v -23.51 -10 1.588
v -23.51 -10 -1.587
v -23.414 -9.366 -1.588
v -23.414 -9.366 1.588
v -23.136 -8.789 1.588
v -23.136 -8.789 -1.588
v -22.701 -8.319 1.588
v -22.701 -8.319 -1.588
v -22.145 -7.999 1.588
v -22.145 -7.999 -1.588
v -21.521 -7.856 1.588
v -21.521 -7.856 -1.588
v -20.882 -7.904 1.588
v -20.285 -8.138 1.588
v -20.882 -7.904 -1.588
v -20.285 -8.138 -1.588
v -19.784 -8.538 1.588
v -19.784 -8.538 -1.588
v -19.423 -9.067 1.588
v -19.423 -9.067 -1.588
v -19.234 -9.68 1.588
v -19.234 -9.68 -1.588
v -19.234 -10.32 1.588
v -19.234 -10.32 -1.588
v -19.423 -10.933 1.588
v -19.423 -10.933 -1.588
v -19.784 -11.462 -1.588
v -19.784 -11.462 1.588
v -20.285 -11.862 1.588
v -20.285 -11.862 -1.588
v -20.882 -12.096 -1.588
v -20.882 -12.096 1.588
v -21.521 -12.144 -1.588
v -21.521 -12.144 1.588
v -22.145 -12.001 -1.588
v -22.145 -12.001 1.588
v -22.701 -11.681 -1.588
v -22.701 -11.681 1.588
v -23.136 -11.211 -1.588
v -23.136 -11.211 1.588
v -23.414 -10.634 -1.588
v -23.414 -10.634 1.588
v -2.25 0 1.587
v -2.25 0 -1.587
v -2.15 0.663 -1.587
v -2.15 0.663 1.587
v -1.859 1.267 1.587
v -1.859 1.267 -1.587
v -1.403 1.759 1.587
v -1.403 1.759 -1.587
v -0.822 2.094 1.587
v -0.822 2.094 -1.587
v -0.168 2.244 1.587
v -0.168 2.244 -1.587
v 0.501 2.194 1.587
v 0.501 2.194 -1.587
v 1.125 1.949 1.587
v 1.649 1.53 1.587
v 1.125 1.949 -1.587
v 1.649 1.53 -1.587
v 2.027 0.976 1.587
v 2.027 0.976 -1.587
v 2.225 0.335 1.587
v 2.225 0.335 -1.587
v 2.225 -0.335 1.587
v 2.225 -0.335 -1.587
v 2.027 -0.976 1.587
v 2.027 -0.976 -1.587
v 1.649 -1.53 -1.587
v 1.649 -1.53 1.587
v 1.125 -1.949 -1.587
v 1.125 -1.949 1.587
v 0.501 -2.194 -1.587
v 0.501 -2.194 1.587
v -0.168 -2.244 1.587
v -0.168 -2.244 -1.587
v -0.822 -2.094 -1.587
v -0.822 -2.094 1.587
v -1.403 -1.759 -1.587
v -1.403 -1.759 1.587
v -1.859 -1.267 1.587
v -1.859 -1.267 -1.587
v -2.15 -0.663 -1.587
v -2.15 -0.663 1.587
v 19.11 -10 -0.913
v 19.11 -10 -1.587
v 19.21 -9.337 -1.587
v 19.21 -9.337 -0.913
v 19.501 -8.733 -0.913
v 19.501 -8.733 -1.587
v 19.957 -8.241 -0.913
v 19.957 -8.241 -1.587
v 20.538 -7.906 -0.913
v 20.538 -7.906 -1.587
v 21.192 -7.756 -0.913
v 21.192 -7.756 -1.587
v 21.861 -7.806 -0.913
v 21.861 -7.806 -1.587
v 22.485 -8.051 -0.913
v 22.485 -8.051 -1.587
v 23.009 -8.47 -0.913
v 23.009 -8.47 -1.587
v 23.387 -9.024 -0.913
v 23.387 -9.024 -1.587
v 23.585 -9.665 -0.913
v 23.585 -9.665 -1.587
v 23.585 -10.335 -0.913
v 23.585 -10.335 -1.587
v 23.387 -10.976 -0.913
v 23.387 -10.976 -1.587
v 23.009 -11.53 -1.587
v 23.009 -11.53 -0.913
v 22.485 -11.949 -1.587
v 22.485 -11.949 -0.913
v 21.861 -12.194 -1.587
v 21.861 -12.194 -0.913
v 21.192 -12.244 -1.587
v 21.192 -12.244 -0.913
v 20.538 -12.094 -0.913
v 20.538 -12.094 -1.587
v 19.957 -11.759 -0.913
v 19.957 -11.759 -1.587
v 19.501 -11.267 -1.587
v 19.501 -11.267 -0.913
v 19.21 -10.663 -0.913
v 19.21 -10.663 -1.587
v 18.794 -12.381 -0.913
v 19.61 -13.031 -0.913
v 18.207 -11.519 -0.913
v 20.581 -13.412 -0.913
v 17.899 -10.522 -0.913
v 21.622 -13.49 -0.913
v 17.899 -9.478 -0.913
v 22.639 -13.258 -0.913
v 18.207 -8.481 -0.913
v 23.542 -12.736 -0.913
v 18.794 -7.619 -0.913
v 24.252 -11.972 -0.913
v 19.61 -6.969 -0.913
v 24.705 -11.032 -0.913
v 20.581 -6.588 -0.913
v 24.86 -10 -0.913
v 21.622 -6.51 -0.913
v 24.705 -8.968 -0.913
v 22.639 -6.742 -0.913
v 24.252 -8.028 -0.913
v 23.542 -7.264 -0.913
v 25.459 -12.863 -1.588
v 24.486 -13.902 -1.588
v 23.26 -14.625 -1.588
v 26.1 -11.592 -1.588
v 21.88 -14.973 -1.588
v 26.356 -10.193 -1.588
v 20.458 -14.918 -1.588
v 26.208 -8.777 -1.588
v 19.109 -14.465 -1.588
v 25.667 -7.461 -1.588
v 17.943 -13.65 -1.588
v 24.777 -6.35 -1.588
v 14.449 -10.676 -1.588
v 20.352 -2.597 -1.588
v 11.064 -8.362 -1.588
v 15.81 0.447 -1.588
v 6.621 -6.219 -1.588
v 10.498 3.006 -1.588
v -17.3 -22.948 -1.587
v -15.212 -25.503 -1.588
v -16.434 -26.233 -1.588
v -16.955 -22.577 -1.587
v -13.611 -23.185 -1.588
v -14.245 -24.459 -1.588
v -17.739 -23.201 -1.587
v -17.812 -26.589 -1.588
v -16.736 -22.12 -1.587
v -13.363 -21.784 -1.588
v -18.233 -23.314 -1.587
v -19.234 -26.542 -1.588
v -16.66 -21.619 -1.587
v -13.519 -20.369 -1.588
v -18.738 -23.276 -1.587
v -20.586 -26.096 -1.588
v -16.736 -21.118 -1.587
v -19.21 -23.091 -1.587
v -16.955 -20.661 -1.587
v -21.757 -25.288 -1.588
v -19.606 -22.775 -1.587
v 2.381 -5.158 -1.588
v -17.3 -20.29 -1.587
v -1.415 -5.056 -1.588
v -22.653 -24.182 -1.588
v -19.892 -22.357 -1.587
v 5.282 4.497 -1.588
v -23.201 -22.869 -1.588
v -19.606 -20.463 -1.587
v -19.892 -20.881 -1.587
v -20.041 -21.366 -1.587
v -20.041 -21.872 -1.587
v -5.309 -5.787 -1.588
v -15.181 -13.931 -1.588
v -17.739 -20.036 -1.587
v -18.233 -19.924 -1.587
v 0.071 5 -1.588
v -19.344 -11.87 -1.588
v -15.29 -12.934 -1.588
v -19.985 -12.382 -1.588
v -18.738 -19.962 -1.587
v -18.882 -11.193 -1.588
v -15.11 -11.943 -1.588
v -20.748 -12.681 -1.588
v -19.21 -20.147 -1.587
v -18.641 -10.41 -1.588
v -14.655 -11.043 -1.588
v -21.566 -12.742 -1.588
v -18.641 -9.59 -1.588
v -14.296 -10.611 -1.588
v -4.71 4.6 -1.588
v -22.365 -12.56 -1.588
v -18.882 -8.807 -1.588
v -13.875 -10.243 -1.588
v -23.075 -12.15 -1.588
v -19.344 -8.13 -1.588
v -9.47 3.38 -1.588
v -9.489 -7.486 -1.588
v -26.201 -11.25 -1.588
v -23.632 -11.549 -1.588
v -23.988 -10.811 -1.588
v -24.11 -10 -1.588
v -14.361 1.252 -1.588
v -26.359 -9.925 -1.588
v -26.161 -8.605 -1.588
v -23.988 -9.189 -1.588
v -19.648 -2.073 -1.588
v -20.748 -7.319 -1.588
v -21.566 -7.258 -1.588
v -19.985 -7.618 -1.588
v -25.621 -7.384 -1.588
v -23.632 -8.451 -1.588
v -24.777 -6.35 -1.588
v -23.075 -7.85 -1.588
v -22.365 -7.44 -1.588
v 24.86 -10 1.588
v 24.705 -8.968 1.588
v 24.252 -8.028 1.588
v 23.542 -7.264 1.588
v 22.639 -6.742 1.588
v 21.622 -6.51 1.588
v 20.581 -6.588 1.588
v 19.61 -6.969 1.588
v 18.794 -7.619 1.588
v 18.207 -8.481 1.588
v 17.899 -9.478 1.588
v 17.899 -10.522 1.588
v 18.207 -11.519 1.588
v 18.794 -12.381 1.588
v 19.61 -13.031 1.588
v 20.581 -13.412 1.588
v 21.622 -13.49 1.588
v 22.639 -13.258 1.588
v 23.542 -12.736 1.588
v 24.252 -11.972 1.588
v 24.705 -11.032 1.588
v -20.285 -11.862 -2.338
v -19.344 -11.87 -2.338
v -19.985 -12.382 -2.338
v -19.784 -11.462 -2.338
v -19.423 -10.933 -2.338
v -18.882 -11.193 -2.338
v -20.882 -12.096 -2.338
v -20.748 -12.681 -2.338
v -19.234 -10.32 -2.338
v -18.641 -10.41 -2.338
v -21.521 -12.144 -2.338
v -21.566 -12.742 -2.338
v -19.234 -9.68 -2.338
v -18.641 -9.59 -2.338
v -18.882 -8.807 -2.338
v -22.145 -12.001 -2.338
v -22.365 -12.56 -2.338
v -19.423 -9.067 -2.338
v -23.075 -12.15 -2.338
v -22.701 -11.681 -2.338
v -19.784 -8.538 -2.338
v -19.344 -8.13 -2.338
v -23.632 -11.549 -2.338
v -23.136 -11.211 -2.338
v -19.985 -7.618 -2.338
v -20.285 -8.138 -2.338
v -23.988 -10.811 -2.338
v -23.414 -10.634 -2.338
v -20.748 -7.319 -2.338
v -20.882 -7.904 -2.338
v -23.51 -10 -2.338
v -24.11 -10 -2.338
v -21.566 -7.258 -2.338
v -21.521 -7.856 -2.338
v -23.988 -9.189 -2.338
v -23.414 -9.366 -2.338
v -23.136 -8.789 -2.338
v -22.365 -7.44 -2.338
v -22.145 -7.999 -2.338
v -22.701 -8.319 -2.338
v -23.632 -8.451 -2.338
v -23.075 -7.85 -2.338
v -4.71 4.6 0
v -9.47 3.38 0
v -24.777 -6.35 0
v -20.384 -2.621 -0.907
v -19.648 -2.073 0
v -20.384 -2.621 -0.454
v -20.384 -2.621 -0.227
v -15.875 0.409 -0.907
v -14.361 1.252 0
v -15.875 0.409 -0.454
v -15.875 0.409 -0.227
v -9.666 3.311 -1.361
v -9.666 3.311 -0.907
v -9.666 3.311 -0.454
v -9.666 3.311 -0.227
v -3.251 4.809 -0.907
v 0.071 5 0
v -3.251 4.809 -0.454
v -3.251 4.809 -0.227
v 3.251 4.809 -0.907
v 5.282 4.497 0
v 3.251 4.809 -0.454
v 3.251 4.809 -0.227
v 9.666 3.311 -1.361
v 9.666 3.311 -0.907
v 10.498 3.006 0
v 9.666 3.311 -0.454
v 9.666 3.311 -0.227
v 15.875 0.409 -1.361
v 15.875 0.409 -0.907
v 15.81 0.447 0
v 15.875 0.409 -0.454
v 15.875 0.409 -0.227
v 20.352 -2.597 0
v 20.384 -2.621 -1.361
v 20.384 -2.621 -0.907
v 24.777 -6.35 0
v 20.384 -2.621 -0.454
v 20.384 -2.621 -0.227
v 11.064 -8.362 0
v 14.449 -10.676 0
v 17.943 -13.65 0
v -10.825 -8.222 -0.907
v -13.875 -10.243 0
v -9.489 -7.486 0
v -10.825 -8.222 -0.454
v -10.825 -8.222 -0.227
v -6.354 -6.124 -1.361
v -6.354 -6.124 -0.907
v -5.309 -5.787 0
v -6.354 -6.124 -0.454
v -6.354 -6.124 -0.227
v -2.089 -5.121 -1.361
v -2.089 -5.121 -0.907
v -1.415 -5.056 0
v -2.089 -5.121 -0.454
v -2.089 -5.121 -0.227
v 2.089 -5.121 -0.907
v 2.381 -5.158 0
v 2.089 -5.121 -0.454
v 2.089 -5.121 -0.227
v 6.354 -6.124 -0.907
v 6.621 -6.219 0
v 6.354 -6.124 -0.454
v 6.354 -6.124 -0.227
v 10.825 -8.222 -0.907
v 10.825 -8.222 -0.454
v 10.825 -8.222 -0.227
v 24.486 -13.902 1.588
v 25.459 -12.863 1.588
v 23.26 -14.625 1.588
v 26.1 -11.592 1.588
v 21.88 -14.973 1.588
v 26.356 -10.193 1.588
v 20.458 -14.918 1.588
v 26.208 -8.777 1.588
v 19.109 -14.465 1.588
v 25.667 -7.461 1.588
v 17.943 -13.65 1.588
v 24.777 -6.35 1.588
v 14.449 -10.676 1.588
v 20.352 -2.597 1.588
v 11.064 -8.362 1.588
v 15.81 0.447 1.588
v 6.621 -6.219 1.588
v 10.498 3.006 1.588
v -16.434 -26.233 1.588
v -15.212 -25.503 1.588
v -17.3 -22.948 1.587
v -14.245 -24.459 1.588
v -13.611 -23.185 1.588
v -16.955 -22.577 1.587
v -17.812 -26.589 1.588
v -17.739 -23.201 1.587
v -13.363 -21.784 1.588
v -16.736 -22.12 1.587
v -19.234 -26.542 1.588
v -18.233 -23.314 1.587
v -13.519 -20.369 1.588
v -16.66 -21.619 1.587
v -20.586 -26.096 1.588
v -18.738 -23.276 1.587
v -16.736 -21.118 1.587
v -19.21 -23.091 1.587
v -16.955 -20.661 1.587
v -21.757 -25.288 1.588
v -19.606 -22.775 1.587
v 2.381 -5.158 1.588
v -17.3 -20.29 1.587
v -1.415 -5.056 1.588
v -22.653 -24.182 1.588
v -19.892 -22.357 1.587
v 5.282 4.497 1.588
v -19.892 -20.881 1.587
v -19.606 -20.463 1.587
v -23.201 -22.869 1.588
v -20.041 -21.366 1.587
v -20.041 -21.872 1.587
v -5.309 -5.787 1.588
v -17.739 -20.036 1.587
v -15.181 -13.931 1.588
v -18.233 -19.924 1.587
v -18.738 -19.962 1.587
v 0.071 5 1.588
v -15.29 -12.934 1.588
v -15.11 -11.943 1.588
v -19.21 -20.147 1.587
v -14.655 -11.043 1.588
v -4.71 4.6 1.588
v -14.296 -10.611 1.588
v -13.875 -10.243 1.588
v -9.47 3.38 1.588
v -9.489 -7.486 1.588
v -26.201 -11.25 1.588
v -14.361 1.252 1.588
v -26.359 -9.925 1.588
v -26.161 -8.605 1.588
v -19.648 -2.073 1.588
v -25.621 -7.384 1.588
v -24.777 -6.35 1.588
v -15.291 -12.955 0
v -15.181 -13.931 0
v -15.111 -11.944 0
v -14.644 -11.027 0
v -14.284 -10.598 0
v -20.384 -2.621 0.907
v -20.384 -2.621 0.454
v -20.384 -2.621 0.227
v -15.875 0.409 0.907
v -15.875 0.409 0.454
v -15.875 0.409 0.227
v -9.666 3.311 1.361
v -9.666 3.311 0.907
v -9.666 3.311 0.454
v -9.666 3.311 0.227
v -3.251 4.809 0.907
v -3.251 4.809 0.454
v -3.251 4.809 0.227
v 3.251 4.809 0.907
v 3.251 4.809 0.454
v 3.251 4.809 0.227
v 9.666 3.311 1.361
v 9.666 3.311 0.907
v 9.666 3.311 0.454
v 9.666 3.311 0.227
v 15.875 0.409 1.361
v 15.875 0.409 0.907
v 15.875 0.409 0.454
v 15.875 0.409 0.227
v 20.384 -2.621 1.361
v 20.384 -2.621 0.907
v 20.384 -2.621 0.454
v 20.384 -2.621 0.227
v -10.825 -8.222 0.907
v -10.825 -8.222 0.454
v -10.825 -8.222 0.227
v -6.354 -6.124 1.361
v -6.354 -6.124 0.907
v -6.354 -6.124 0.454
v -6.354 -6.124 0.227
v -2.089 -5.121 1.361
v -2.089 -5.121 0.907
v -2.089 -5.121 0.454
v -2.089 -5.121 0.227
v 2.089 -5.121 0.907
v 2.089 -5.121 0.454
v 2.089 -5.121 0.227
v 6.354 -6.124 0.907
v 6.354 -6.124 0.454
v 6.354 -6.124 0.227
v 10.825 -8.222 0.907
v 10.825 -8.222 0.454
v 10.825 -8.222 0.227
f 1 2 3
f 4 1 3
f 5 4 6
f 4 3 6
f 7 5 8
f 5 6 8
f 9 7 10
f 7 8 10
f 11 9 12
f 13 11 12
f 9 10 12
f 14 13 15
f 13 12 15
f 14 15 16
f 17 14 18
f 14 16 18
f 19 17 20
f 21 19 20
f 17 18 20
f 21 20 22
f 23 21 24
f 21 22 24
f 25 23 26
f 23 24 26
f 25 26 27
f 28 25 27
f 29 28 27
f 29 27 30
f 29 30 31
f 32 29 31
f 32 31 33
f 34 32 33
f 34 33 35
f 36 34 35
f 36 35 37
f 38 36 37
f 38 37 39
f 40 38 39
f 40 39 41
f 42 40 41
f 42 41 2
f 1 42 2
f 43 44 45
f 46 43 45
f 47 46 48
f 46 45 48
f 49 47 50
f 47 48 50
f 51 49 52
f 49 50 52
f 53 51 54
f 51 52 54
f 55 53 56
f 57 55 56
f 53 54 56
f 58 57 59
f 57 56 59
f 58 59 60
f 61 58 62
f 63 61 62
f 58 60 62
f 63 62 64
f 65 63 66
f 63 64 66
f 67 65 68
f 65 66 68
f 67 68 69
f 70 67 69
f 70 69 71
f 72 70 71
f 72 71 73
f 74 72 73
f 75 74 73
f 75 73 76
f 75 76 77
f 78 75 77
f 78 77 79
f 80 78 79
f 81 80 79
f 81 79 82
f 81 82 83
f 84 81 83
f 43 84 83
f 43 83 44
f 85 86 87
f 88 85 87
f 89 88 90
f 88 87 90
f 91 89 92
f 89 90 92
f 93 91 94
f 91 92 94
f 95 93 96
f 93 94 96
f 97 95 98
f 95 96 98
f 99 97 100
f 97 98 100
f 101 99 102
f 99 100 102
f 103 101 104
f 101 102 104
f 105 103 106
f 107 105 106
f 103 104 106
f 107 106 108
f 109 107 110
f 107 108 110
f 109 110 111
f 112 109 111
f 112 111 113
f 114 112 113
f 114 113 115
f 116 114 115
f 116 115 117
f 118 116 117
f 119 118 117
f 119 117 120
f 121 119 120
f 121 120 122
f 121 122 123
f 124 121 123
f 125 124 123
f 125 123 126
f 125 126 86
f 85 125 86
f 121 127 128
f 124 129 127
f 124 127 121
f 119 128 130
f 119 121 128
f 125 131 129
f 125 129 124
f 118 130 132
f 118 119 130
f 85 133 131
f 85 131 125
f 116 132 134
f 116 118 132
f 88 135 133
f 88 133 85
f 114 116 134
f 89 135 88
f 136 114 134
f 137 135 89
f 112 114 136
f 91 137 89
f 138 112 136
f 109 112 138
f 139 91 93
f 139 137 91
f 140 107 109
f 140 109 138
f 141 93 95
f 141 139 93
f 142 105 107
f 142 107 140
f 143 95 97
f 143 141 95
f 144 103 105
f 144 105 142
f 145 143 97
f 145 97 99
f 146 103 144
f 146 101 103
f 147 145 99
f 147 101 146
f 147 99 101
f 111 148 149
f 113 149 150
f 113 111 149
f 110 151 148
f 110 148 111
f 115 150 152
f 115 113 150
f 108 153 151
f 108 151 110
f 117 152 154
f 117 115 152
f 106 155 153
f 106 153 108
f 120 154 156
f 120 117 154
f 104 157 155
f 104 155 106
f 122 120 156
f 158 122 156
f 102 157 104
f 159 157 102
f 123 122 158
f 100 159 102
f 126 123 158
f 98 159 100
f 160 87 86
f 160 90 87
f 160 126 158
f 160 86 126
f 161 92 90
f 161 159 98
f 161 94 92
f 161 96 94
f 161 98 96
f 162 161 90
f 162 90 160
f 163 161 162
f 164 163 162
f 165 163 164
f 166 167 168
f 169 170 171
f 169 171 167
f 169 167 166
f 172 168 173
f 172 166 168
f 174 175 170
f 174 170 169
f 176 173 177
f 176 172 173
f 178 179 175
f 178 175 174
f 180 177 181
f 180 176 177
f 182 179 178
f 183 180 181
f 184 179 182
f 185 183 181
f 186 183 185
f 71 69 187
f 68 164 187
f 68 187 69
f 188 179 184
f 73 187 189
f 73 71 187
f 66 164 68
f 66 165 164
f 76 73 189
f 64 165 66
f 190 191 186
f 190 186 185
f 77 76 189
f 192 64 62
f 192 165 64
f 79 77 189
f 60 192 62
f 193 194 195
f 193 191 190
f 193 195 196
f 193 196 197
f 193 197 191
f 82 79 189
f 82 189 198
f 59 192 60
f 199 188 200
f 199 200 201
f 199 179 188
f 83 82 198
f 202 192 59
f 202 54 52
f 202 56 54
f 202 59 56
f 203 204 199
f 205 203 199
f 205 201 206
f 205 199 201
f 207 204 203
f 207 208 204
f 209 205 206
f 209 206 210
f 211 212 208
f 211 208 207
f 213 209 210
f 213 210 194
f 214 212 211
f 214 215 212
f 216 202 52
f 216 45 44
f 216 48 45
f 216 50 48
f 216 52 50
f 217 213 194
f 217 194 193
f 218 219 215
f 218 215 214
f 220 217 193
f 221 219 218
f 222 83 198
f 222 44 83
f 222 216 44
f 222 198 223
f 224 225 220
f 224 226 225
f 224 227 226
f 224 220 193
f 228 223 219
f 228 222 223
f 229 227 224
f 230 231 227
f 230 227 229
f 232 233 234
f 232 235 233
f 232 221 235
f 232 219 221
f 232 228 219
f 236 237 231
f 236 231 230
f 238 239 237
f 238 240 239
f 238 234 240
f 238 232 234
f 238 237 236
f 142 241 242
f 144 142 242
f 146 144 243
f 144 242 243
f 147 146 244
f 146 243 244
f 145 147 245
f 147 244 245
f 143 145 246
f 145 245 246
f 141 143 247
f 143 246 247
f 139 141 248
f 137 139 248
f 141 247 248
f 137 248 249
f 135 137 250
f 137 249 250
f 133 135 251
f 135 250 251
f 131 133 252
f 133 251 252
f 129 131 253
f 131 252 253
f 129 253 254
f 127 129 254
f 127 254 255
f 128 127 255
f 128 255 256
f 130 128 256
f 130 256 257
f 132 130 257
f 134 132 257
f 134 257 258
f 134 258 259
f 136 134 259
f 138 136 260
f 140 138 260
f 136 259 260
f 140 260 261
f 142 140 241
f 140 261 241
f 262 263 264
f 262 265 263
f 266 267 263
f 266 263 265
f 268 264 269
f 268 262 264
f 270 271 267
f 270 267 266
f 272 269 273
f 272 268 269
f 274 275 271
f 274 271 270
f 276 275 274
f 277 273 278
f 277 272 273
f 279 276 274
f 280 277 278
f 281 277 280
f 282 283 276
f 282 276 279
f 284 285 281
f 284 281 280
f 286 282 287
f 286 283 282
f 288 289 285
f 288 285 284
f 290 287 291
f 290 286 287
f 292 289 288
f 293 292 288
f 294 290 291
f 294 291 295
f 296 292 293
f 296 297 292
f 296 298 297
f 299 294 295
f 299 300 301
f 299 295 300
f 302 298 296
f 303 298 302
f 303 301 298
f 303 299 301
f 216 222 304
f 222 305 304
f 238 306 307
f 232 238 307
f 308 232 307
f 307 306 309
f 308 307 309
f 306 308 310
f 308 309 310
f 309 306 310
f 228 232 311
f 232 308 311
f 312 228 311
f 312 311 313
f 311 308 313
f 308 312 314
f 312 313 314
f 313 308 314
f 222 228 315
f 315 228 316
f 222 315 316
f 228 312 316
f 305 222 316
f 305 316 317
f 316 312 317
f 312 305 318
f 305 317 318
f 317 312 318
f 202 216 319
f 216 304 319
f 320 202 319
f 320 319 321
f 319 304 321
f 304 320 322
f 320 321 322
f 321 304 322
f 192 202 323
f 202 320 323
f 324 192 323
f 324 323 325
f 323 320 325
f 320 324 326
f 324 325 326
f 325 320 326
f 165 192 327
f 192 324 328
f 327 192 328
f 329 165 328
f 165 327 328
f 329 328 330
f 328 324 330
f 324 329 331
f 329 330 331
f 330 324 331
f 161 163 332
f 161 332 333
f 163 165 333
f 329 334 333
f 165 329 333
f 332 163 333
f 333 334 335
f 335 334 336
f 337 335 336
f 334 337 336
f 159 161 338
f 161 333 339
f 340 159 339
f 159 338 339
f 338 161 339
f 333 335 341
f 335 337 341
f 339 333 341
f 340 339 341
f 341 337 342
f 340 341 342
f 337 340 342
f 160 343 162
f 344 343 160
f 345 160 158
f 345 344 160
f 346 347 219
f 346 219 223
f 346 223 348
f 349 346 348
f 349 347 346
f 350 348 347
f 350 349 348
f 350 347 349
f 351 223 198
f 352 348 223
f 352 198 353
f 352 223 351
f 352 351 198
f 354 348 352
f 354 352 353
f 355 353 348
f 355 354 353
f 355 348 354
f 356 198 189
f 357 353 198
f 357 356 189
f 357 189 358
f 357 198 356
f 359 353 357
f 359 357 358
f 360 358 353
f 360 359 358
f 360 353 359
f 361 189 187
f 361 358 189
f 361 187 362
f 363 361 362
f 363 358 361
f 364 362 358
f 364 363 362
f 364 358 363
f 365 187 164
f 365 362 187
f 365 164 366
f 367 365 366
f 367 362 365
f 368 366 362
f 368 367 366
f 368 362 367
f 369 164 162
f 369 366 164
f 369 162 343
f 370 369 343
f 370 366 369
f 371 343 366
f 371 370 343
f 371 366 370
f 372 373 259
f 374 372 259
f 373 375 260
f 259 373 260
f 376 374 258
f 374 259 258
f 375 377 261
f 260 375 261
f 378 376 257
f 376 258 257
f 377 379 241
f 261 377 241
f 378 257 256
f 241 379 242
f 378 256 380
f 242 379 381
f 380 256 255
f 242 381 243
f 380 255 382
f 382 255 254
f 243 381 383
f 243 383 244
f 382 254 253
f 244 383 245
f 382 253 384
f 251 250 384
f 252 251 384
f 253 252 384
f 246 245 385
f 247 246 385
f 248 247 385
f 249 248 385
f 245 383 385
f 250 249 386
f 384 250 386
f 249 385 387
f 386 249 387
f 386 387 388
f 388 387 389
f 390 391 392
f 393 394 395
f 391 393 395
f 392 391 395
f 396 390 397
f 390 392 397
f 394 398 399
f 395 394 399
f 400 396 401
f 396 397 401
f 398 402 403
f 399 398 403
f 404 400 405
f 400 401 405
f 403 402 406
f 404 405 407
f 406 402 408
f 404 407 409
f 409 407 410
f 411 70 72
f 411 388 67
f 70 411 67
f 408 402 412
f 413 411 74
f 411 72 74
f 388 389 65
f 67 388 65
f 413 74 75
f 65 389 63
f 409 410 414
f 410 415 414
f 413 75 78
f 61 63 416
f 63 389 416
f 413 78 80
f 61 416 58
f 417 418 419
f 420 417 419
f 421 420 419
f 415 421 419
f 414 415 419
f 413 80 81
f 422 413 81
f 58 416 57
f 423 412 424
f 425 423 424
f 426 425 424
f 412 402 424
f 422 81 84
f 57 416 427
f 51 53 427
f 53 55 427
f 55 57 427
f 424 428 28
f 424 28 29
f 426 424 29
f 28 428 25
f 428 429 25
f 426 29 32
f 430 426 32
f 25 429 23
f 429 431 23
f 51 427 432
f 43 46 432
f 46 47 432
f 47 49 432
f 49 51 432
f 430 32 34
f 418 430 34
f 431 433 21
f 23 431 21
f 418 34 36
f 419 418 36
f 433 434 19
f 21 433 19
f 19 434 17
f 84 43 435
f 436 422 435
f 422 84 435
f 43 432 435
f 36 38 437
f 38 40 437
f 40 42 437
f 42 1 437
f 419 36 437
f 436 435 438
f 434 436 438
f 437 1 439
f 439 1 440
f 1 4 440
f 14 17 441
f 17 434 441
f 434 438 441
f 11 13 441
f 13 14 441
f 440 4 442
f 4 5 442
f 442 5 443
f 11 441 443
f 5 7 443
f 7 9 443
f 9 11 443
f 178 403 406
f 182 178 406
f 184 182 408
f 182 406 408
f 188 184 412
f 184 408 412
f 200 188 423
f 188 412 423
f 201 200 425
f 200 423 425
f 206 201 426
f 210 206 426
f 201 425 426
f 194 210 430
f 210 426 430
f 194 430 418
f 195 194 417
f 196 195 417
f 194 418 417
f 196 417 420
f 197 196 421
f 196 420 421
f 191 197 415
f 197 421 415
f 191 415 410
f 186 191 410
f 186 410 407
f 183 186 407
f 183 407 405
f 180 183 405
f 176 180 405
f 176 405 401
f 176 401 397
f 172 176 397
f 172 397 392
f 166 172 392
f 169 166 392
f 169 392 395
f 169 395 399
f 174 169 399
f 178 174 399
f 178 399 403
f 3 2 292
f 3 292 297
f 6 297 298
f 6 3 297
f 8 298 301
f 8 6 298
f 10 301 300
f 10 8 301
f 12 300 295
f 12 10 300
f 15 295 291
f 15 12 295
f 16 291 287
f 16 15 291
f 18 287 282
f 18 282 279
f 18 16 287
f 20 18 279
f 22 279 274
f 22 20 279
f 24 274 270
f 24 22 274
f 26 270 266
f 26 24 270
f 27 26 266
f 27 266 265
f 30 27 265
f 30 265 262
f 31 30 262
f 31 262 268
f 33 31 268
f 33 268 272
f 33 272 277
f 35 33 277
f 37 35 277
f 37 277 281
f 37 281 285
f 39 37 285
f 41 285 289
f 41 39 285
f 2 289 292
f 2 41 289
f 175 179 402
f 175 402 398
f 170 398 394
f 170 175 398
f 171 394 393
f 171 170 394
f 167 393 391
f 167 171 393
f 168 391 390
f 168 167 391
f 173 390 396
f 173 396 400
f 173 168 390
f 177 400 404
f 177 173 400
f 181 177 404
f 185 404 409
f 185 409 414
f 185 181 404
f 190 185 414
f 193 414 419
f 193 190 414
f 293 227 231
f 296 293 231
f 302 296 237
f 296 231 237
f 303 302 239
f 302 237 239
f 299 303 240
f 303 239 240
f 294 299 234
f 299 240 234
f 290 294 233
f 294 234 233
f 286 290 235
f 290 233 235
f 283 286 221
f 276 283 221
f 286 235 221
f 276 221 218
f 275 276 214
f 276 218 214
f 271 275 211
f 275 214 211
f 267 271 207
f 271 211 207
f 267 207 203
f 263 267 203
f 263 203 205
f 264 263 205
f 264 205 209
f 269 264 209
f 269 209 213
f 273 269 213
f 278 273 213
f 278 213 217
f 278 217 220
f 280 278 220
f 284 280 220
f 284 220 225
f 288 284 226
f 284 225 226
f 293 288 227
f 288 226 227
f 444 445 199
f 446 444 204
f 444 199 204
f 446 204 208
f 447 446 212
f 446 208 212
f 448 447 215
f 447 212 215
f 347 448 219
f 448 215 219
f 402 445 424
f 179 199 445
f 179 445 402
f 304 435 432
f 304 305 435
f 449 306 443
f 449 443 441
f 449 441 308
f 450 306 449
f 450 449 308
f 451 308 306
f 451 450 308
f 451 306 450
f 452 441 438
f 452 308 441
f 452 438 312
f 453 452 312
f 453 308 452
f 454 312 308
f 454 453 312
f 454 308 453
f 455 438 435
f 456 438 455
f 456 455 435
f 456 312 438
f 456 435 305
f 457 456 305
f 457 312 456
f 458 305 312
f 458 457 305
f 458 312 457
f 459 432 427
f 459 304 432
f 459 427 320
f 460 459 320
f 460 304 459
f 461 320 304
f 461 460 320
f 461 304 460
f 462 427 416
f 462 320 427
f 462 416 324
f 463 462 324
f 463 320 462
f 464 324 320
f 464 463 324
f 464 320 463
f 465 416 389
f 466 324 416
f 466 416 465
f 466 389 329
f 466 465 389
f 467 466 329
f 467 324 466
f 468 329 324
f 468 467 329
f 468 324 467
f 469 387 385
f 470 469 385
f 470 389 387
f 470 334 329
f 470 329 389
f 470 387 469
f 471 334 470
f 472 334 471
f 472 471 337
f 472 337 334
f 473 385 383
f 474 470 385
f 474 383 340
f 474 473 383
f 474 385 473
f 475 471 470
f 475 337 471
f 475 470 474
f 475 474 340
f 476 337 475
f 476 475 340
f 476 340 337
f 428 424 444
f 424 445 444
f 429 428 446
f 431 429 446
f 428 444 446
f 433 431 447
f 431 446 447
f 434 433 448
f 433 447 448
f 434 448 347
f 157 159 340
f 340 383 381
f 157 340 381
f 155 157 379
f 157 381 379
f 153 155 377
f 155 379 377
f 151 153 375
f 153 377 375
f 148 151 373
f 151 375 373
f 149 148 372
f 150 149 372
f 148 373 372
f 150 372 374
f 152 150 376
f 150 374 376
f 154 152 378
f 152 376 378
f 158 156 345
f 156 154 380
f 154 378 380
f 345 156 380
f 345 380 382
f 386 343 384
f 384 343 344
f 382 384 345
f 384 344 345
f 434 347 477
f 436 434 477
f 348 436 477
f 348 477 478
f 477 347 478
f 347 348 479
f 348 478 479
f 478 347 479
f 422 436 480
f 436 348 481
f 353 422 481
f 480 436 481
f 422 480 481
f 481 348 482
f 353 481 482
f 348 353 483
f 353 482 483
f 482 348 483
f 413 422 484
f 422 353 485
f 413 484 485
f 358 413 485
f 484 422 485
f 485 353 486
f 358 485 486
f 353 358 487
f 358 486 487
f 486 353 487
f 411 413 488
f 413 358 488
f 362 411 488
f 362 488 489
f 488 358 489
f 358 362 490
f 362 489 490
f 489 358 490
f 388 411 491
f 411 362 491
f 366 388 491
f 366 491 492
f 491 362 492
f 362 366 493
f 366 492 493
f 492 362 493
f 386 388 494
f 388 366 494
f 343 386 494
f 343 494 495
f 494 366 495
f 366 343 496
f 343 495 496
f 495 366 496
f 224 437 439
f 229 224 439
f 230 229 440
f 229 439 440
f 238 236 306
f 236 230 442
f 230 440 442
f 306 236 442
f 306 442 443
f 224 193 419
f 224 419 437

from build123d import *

# Parameters (mm, degrees)
BOSS_EXTRUDE1_DEPTH  = 1.5875
M4_CLEARANCE_HOLE1_D = 4.5
BOSS_EXTRUDE2_DEPTH  = 3.175
FILLET1_R            = 3.5
M3_CLEARANCE_HOLE1_D = 3.4
SKETCH8_R            = 2.15
CUT_EXTRUDE1_DEPTH   = 4.1750001
SKETCH9_R            = 2.75
SKETCH9_R_2          = 2.15
BOSS_EXTRUDE3_DEPTH  = 0.75
SKETCH10_R           = 3.5
CUT_EXTRUDE2_DEPTH   = 2.5


with BuildPart() as part:
    # Sketch2 → Boss-Extrude1 (new body, symmetric)
    with BuildSketch(Plane.XY):
        with BuildLine():
            ThreePointArc((-17.942568571, -13.649816766), (-25.009816766, -13.417431429), (-24.777431429, -6.350183234))
            add(Edge.make_bspline(
                [(-24.777431429, -6.350183234), (-20.441430485, -2.271315687), (-12.829947979, 2.196277878), (-6.501150321, 4.42663028), (0, 5.19112324), (6.501150321, 4.42663028), (12.829947979, 2.196277878), (20.441430485, -2.271315687), (24.777431429, -6.350183234)],
                knots=[0, 0, 0, 0.1875, 0.3125, 0.4375, 0.5625, 0.6875, 0.8125, 1, 1, 1], degree=2))
            ThreePointArc((24.777431429, -6.350183234), (25.009816766, -13.417431429), (17.942568571, -13.649816766))
            add(Edge.make_bspline(
                [(-17.942568571, -13.649816766), (-14.268569515, -10.228684313), (-8.530052021, -6.883777878), (-4.178849679, -5.36413028), (0, -4.87862324), (4.178849679, -5.36413028), (8.530052021, -6.883777878), (14.268569515, -10.228684313), (17.942568571, -13.649816766)],
                knots=[0, 0, 0, 0.1875, 0.3125, 0.4375, 0.5625, 0.6875, 0.8125, 1, 1, 1], degree=2))
        make_face()
    extrude(amount=BOSS_EXTRUDE1_DEPTH, both=True)

    # M4 Clearance Hole1 (through all)
    with Locations(Plane.XY.offset(1.5875)):
        with Locations((21.36, -10), (0, 0)):
            Hole(M4_CLEARANCE_HOLE1_D / 2)

    # Sketch5 → Boss-Extrude2 (add)
    with BuildSketch(Plane(origin=(0, 0, -1.5875), x_dir=(-1, 0, 0), z_dir=(0, 0, -1))):
        with BuildLine():
            ThreePointArc((13.518770817, -20.368950039), (17.11, -26.460179221), (23.201229183, -22.868950039))
            Line((23.201229183, -22.868950039), (26.201229183, -11.25))
            ThreePointArc((26.201229183, -11.25), (22.61, -5.158770817), (16.518770817, -8.75))
            Line((16.518770817, -8.75), (13.518770817, -20.368950039))
        make_face()
    extrude(amount=-BOSS_EXTRUDE2_DEPTH)

    # Fillet1
    fillet1_edges = [part.edges().sort_by_distance(p)[0] for p in [
        (-15.752223744, -11.718824048, 0.7937488),
    ]]
    fillet(fillet1_edges, radius=FILLET1_R)

    # M3 Clearance Hole1 (through all)
    with Locations(Plane(origin=(0, 0, -1.5875), x_dir=(-1, 0, 0), z_dir=(0, 0, -1))):
        with Locations((18.36, -21.618950039)):
            Hole(M3_CLEARANCE_HOLE1_D / 2)

    # Sketch8 → Cut-Extrude1 (cut, through all)
    with BuildSketch(Plane(origin=(0, 0, -1.5875), x_dir=(-1, 0, 0), z_dir=(0, 0, -1))):
        with Locations((21.36, -10)):
            Circle(SKETCH8_R)
    extrude(amount=-CUT_EXTRUDE1_DEPTH, mode=Mode.SUBTRACT)

    # Sketch9 → Boss-Extrude3 (add)
    with BuildSketch(Plane(origin=(0, 0, -1.5875), x_dir=(-1, 0, 0), z_dir=(0, 0, -1))):
        with Locations((21.36, -10)):
            Circle(SKETCH9_R)
        with Locations((21.36, -10)):
            Circle(SKETCH9_R_2, mode=Mode.SUBTRACT)
    extrude(amount=BOSS_EXTRUDE3_DEPTH)

    # Sketch10 → Cut-Extrude2 (cut)
    with BuildSketch(Plane.XY.offset(1.5875)):
        with Locations((21.36, -10)):
            Circle(SKETCH10_R)
    extrude(amount=-CUT_EXTRUDE2_DEPTH, mode=Mode.SUBTRACT)


solid = part.part
